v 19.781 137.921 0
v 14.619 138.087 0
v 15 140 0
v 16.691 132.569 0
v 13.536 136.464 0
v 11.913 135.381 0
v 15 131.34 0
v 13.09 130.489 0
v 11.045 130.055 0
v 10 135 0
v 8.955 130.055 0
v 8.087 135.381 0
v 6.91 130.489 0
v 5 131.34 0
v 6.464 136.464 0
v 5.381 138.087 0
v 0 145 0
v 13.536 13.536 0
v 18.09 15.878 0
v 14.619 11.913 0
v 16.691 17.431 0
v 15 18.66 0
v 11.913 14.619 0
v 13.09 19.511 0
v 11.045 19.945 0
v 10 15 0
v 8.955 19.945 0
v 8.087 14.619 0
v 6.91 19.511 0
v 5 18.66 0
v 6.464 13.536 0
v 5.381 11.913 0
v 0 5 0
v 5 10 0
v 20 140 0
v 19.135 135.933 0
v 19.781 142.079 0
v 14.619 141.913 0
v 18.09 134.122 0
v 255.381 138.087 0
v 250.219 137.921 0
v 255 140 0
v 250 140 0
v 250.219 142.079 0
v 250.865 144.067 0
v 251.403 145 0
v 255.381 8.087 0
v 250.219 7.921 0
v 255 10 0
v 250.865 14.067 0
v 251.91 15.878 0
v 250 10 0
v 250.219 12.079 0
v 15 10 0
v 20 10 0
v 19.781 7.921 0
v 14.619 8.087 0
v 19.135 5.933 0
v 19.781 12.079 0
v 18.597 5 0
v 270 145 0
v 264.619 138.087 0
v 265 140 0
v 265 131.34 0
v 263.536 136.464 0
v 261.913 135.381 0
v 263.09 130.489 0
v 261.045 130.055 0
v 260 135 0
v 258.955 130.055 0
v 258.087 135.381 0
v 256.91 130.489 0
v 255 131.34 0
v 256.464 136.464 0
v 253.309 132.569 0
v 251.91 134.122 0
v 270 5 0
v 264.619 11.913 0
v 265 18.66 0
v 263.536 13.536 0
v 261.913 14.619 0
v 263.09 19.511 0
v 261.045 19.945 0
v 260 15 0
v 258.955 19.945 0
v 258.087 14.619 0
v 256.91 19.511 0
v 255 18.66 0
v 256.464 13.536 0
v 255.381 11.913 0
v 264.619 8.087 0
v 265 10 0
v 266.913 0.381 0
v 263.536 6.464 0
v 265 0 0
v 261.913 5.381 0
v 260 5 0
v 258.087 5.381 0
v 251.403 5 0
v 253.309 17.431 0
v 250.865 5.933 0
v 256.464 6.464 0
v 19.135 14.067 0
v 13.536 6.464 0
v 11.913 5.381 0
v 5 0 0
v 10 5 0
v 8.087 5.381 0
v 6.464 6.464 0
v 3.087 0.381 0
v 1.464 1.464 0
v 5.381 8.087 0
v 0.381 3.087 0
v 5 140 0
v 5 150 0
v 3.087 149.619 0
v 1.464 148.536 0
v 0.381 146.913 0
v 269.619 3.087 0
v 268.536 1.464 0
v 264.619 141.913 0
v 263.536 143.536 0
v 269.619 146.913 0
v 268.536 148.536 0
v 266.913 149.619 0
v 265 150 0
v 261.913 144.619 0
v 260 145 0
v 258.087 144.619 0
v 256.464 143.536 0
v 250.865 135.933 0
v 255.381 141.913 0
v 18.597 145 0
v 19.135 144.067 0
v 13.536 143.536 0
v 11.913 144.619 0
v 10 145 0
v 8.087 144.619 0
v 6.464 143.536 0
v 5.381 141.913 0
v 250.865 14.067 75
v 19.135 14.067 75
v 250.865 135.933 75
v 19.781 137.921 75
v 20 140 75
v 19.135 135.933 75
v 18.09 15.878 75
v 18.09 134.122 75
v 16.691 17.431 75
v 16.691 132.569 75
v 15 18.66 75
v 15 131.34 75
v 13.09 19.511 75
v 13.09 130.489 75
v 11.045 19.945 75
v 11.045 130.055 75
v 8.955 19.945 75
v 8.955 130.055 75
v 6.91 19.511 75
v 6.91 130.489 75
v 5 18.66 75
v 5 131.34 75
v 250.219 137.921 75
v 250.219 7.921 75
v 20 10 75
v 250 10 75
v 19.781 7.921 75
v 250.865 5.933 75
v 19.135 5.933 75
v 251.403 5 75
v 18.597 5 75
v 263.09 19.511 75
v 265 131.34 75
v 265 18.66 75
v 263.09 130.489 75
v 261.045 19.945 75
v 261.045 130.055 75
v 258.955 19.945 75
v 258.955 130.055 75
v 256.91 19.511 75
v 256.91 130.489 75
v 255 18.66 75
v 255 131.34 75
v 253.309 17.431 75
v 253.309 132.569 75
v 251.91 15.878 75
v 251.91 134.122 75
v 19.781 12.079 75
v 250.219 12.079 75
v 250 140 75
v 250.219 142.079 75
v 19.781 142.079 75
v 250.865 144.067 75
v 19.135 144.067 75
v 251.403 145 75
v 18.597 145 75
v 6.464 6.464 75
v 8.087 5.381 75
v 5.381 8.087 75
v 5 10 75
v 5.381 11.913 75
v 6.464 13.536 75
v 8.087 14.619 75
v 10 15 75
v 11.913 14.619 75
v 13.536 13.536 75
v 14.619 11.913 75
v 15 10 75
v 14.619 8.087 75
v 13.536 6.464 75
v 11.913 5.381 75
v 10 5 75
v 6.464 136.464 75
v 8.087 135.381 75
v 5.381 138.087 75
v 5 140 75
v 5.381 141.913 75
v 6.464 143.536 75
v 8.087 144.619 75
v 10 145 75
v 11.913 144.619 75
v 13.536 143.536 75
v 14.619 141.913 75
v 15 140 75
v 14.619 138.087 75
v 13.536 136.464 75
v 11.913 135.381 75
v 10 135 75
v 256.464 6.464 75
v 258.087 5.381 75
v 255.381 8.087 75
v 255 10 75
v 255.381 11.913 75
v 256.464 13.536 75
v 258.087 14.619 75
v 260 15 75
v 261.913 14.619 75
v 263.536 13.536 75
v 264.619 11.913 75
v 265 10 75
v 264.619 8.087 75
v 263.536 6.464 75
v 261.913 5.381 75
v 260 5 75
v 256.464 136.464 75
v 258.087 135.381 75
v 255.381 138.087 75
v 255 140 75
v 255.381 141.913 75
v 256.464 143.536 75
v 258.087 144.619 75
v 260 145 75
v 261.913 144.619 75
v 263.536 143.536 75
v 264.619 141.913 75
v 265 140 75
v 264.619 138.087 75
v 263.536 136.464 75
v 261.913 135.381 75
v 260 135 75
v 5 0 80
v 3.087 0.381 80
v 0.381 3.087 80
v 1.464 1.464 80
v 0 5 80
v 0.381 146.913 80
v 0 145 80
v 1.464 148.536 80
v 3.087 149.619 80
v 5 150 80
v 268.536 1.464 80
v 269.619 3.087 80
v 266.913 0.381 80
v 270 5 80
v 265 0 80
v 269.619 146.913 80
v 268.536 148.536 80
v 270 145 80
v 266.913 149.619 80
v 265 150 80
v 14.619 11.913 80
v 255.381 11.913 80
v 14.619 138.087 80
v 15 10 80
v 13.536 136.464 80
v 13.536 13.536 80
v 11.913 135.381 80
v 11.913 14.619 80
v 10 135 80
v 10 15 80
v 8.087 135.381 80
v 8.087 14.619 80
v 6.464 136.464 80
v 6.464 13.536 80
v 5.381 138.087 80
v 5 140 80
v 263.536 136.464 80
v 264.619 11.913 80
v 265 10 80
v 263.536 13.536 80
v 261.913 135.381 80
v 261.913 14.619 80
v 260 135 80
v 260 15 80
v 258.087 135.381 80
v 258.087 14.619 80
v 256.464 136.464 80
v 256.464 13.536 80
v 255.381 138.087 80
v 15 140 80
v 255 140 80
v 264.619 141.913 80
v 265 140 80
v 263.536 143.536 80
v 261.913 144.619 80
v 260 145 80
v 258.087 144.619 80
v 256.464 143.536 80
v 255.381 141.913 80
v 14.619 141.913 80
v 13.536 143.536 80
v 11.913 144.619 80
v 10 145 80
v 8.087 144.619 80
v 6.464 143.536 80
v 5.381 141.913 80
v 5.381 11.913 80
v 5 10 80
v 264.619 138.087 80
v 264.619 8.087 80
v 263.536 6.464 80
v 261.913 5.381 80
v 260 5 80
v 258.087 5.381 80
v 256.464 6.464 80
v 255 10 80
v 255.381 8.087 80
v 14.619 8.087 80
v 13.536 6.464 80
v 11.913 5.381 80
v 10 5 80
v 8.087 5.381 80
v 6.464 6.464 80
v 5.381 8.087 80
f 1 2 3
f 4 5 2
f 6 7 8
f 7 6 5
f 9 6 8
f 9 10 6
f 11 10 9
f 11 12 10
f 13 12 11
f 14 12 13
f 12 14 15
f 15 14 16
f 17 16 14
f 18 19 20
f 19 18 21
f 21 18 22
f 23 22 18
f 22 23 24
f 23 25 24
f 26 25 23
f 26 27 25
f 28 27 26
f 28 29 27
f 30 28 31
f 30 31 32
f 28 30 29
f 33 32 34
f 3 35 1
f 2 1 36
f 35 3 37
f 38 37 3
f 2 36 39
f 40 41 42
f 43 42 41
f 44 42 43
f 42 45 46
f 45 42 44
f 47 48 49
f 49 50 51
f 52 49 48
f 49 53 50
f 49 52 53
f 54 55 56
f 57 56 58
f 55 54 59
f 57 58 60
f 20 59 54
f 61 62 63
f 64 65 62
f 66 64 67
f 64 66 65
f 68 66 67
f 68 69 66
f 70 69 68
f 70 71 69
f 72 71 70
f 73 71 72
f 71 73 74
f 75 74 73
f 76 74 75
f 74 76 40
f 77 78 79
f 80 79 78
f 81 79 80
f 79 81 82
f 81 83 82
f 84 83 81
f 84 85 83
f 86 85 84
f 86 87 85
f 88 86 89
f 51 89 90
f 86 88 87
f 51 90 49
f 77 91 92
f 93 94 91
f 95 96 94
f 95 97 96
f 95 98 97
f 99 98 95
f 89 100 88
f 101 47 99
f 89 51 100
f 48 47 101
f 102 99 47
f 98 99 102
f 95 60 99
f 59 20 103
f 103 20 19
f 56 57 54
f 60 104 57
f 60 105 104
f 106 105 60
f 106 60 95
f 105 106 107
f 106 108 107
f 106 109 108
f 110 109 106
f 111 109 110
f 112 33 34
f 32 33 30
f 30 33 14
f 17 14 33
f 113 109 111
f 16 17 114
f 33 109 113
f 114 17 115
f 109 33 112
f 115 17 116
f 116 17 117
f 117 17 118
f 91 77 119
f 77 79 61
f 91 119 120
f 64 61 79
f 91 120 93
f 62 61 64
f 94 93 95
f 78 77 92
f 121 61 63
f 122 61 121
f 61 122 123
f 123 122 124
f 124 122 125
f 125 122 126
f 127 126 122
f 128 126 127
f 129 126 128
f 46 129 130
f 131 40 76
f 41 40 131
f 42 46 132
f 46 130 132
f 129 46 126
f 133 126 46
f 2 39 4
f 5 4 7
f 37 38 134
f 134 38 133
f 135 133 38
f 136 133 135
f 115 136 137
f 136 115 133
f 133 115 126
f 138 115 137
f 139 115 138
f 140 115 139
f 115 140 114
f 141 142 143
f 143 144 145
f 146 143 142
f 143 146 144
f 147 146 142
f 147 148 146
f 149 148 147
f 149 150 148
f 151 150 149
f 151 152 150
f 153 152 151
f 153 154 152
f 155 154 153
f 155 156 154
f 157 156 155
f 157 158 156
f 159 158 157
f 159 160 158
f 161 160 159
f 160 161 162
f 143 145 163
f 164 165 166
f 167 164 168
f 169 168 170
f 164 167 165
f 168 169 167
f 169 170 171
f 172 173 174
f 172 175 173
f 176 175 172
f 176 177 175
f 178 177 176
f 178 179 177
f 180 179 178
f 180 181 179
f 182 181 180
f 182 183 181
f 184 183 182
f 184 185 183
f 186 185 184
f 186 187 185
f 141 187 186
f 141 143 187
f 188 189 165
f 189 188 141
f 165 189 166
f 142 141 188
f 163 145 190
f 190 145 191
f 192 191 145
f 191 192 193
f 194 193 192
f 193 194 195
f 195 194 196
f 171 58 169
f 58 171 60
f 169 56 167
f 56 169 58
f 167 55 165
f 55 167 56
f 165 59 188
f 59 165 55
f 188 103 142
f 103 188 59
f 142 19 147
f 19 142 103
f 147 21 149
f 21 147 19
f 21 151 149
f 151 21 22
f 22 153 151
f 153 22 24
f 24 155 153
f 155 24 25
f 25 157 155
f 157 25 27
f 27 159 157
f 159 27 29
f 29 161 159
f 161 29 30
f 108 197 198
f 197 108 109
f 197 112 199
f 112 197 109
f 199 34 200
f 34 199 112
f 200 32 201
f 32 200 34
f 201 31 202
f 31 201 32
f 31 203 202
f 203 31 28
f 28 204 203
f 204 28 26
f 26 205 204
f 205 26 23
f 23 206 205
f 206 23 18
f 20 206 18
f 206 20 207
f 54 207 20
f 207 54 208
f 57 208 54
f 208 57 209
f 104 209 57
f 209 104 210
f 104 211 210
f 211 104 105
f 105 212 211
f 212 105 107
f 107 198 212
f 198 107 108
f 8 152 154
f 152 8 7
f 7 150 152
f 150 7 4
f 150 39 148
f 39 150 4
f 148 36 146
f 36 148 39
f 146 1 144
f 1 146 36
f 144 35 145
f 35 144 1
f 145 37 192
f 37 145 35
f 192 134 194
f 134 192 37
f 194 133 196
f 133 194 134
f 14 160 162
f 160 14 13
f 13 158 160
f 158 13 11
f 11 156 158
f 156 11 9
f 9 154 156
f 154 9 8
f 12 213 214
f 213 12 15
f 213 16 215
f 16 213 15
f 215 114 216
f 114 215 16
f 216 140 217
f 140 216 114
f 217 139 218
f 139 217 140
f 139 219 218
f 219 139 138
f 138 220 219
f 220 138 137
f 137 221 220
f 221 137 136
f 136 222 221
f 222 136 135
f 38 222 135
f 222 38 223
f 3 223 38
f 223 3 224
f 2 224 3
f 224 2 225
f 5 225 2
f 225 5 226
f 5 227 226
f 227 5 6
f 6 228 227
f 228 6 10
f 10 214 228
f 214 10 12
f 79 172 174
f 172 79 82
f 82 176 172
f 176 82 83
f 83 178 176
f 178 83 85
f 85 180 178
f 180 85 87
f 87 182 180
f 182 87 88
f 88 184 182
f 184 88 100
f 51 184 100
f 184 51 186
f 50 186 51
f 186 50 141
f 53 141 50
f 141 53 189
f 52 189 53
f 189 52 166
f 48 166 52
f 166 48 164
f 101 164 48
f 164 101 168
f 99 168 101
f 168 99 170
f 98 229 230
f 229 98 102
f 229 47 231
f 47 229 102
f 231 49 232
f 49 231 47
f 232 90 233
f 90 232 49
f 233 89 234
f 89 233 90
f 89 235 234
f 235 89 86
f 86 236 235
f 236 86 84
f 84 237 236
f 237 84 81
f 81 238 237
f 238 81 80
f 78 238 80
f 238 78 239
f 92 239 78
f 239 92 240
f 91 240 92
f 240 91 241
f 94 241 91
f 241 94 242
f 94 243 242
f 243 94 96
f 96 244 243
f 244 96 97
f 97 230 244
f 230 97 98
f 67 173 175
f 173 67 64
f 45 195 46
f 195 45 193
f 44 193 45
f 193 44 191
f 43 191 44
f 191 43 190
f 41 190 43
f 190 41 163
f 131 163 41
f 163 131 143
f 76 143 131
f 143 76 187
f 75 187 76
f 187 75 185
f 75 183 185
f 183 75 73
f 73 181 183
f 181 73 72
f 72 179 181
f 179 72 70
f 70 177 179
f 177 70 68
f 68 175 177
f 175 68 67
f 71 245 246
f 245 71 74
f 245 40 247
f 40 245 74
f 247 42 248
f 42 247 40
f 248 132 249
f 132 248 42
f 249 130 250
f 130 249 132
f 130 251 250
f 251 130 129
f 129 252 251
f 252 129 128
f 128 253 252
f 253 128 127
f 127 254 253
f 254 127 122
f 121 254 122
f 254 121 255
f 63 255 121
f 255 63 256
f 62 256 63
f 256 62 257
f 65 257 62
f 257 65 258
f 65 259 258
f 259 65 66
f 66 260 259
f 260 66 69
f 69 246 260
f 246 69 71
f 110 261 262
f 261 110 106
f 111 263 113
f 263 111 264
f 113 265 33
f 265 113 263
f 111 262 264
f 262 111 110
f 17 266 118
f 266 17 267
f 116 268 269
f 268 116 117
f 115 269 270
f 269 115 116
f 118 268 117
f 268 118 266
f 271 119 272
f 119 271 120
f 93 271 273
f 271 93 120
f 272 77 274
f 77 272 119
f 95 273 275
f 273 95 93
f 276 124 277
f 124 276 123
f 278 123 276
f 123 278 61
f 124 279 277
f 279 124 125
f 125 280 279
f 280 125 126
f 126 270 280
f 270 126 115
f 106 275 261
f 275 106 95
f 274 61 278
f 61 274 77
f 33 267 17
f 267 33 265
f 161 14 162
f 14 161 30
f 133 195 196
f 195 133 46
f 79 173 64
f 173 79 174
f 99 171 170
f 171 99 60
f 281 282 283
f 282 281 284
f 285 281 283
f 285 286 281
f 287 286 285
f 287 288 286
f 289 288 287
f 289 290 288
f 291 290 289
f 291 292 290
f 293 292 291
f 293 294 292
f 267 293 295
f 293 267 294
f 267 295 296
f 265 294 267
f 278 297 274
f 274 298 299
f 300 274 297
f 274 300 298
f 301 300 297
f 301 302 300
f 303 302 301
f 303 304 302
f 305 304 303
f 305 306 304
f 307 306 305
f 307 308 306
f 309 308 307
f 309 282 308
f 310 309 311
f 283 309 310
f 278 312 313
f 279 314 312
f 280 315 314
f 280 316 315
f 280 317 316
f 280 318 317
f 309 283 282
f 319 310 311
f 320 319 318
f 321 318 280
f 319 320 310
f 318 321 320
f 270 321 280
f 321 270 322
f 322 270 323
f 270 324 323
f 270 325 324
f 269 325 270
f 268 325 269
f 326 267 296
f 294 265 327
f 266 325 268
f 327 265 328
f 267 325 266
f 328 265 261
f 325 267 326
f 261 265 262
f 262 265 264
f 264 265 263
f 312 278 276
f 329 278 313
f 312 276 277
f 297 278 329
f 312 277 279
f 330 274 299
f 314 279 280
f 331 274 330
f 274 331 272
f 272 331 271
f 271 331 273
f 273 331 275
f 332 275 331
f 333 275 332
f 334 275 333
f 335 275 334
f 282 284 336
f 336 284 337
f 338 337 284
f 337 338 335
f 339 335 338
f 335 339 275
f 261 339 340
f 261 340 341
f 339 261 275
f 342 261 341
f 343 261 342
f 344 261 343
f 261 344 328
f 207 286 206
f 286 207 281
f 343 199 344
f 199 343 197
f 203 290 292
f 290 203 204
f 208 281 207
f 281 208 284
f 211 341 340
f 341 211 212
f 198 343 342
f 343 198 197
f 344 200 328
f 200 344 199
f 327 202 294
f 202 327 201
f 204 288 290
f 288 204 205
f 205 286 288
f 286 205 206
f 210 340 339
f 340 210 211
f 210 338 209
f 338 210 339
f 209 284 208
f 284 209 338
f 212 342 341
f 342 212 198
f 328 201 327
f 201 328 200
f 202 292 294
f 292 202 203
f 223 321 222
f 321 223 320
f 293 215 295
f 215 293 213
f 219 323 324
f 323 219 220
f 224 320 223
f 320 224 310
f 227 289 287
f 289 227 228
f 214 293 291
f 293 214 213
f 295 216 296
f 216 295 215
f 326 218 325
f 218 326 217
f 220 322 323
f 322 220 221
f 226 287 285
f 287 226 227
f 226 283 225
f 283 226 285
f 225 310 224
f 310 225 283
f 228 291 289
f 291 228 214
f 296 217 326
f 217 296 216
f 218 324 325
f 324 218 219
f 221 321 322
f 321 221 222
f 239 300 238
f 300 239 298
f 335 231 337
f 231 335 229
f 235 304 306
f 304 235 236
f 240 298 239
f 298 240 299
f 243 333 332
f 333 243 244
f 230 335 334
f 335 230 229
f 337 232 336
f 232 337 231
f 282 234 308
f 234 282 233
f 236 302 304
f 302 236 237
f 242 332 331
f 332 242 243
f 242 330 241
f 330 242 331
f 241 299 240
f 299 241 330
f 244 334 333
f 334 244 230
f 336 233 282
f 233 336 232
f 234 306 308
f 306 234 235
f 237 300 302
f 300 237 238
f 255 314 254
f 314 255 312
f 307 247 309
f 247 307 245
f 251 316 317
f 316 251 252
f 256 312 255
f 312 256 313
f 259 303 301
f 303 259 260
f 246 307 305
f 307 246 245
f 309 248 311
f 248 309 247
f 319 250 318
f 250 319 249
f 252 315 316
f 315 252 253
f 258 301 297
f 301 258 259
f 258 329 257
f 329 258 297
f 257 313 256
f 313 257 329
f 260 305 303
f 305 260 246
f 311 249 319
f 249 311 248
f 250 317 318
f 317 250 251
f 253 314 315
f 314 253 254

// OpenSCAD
use <MCAD/boxes.scad>

// Choose Part
part = "both"; // [first:Case Only,second:Cover Plate Only,both:Both]

// Width of the case
width = 270;

// Depth of the case
depth = 150;

// Height of the case
height = 75;

// Material thickness of the case and plates
material_thickness = 5;

// Corner radius of rounded corners
corner_radius = 5;

// Hole offset
hole_offset = 10; //[1:14]

// Hole diameter
hole_diameter = 10;

print_part();

module print_part() {
	if (part == "first") {
		base();
	} else if (part == "second") {
		plate();
	} else if (part == "both") {
		both();
	} else {
		both();
	}
}

module both(){
	base();
	translate([0,0,height])
		plate();
}

module base(){
	// All dimensions in mm
	x = width;
	y = depth;
	z = height;

	union(){
		for (i=[ [hole_offset,hole_offset, 0],
				[hole_offset,y-hole_offset, 0],
				[x-hole_offset,hole_offset, 0],
				[x-hole_offset,y-hole_offset, 0] ])
			{
			translate(i){
				linear_extrude(height=z){
					difference(){
						circle(r=(hole_diameter));
						circle(r=(hole_diameter/2));
					}
				}
			}
		}
		difference(){
			translate([x/2, y/2, height/2]){
			  roundedBox([x, y, height], 5, true);
			}
			translate([material_thickness, material_thickness, 0]) {
				linear_extrude(height=z)
				square(size = [x-(material_thickness*2), y-(material_thickness*2)], center = false);
		   	}
		}
	}
}


module plate(){
	// All dimensions in mm
	x = width;
	y = depth;
	z = material_thickness;

	difference() {
		// create the base
		translate([x/2, y/2, z/2]){
		  roundedBox([x, y, z], corner_radius, true);
		}
		// Create 4 holes
		for (i = [ [hole_offset,hole_offset, -10],
			[hole_offset,y-hole_offset, -10],
			[x-hole_offset,hole_offset, -10],
			[x-hole_offset,y-hole_offset, -10] ])
		{
			translate(i) {
				linear_extrude(height = z + 10)
				circle(r=(hole_diameter/2));
			}
		}
	}
}
